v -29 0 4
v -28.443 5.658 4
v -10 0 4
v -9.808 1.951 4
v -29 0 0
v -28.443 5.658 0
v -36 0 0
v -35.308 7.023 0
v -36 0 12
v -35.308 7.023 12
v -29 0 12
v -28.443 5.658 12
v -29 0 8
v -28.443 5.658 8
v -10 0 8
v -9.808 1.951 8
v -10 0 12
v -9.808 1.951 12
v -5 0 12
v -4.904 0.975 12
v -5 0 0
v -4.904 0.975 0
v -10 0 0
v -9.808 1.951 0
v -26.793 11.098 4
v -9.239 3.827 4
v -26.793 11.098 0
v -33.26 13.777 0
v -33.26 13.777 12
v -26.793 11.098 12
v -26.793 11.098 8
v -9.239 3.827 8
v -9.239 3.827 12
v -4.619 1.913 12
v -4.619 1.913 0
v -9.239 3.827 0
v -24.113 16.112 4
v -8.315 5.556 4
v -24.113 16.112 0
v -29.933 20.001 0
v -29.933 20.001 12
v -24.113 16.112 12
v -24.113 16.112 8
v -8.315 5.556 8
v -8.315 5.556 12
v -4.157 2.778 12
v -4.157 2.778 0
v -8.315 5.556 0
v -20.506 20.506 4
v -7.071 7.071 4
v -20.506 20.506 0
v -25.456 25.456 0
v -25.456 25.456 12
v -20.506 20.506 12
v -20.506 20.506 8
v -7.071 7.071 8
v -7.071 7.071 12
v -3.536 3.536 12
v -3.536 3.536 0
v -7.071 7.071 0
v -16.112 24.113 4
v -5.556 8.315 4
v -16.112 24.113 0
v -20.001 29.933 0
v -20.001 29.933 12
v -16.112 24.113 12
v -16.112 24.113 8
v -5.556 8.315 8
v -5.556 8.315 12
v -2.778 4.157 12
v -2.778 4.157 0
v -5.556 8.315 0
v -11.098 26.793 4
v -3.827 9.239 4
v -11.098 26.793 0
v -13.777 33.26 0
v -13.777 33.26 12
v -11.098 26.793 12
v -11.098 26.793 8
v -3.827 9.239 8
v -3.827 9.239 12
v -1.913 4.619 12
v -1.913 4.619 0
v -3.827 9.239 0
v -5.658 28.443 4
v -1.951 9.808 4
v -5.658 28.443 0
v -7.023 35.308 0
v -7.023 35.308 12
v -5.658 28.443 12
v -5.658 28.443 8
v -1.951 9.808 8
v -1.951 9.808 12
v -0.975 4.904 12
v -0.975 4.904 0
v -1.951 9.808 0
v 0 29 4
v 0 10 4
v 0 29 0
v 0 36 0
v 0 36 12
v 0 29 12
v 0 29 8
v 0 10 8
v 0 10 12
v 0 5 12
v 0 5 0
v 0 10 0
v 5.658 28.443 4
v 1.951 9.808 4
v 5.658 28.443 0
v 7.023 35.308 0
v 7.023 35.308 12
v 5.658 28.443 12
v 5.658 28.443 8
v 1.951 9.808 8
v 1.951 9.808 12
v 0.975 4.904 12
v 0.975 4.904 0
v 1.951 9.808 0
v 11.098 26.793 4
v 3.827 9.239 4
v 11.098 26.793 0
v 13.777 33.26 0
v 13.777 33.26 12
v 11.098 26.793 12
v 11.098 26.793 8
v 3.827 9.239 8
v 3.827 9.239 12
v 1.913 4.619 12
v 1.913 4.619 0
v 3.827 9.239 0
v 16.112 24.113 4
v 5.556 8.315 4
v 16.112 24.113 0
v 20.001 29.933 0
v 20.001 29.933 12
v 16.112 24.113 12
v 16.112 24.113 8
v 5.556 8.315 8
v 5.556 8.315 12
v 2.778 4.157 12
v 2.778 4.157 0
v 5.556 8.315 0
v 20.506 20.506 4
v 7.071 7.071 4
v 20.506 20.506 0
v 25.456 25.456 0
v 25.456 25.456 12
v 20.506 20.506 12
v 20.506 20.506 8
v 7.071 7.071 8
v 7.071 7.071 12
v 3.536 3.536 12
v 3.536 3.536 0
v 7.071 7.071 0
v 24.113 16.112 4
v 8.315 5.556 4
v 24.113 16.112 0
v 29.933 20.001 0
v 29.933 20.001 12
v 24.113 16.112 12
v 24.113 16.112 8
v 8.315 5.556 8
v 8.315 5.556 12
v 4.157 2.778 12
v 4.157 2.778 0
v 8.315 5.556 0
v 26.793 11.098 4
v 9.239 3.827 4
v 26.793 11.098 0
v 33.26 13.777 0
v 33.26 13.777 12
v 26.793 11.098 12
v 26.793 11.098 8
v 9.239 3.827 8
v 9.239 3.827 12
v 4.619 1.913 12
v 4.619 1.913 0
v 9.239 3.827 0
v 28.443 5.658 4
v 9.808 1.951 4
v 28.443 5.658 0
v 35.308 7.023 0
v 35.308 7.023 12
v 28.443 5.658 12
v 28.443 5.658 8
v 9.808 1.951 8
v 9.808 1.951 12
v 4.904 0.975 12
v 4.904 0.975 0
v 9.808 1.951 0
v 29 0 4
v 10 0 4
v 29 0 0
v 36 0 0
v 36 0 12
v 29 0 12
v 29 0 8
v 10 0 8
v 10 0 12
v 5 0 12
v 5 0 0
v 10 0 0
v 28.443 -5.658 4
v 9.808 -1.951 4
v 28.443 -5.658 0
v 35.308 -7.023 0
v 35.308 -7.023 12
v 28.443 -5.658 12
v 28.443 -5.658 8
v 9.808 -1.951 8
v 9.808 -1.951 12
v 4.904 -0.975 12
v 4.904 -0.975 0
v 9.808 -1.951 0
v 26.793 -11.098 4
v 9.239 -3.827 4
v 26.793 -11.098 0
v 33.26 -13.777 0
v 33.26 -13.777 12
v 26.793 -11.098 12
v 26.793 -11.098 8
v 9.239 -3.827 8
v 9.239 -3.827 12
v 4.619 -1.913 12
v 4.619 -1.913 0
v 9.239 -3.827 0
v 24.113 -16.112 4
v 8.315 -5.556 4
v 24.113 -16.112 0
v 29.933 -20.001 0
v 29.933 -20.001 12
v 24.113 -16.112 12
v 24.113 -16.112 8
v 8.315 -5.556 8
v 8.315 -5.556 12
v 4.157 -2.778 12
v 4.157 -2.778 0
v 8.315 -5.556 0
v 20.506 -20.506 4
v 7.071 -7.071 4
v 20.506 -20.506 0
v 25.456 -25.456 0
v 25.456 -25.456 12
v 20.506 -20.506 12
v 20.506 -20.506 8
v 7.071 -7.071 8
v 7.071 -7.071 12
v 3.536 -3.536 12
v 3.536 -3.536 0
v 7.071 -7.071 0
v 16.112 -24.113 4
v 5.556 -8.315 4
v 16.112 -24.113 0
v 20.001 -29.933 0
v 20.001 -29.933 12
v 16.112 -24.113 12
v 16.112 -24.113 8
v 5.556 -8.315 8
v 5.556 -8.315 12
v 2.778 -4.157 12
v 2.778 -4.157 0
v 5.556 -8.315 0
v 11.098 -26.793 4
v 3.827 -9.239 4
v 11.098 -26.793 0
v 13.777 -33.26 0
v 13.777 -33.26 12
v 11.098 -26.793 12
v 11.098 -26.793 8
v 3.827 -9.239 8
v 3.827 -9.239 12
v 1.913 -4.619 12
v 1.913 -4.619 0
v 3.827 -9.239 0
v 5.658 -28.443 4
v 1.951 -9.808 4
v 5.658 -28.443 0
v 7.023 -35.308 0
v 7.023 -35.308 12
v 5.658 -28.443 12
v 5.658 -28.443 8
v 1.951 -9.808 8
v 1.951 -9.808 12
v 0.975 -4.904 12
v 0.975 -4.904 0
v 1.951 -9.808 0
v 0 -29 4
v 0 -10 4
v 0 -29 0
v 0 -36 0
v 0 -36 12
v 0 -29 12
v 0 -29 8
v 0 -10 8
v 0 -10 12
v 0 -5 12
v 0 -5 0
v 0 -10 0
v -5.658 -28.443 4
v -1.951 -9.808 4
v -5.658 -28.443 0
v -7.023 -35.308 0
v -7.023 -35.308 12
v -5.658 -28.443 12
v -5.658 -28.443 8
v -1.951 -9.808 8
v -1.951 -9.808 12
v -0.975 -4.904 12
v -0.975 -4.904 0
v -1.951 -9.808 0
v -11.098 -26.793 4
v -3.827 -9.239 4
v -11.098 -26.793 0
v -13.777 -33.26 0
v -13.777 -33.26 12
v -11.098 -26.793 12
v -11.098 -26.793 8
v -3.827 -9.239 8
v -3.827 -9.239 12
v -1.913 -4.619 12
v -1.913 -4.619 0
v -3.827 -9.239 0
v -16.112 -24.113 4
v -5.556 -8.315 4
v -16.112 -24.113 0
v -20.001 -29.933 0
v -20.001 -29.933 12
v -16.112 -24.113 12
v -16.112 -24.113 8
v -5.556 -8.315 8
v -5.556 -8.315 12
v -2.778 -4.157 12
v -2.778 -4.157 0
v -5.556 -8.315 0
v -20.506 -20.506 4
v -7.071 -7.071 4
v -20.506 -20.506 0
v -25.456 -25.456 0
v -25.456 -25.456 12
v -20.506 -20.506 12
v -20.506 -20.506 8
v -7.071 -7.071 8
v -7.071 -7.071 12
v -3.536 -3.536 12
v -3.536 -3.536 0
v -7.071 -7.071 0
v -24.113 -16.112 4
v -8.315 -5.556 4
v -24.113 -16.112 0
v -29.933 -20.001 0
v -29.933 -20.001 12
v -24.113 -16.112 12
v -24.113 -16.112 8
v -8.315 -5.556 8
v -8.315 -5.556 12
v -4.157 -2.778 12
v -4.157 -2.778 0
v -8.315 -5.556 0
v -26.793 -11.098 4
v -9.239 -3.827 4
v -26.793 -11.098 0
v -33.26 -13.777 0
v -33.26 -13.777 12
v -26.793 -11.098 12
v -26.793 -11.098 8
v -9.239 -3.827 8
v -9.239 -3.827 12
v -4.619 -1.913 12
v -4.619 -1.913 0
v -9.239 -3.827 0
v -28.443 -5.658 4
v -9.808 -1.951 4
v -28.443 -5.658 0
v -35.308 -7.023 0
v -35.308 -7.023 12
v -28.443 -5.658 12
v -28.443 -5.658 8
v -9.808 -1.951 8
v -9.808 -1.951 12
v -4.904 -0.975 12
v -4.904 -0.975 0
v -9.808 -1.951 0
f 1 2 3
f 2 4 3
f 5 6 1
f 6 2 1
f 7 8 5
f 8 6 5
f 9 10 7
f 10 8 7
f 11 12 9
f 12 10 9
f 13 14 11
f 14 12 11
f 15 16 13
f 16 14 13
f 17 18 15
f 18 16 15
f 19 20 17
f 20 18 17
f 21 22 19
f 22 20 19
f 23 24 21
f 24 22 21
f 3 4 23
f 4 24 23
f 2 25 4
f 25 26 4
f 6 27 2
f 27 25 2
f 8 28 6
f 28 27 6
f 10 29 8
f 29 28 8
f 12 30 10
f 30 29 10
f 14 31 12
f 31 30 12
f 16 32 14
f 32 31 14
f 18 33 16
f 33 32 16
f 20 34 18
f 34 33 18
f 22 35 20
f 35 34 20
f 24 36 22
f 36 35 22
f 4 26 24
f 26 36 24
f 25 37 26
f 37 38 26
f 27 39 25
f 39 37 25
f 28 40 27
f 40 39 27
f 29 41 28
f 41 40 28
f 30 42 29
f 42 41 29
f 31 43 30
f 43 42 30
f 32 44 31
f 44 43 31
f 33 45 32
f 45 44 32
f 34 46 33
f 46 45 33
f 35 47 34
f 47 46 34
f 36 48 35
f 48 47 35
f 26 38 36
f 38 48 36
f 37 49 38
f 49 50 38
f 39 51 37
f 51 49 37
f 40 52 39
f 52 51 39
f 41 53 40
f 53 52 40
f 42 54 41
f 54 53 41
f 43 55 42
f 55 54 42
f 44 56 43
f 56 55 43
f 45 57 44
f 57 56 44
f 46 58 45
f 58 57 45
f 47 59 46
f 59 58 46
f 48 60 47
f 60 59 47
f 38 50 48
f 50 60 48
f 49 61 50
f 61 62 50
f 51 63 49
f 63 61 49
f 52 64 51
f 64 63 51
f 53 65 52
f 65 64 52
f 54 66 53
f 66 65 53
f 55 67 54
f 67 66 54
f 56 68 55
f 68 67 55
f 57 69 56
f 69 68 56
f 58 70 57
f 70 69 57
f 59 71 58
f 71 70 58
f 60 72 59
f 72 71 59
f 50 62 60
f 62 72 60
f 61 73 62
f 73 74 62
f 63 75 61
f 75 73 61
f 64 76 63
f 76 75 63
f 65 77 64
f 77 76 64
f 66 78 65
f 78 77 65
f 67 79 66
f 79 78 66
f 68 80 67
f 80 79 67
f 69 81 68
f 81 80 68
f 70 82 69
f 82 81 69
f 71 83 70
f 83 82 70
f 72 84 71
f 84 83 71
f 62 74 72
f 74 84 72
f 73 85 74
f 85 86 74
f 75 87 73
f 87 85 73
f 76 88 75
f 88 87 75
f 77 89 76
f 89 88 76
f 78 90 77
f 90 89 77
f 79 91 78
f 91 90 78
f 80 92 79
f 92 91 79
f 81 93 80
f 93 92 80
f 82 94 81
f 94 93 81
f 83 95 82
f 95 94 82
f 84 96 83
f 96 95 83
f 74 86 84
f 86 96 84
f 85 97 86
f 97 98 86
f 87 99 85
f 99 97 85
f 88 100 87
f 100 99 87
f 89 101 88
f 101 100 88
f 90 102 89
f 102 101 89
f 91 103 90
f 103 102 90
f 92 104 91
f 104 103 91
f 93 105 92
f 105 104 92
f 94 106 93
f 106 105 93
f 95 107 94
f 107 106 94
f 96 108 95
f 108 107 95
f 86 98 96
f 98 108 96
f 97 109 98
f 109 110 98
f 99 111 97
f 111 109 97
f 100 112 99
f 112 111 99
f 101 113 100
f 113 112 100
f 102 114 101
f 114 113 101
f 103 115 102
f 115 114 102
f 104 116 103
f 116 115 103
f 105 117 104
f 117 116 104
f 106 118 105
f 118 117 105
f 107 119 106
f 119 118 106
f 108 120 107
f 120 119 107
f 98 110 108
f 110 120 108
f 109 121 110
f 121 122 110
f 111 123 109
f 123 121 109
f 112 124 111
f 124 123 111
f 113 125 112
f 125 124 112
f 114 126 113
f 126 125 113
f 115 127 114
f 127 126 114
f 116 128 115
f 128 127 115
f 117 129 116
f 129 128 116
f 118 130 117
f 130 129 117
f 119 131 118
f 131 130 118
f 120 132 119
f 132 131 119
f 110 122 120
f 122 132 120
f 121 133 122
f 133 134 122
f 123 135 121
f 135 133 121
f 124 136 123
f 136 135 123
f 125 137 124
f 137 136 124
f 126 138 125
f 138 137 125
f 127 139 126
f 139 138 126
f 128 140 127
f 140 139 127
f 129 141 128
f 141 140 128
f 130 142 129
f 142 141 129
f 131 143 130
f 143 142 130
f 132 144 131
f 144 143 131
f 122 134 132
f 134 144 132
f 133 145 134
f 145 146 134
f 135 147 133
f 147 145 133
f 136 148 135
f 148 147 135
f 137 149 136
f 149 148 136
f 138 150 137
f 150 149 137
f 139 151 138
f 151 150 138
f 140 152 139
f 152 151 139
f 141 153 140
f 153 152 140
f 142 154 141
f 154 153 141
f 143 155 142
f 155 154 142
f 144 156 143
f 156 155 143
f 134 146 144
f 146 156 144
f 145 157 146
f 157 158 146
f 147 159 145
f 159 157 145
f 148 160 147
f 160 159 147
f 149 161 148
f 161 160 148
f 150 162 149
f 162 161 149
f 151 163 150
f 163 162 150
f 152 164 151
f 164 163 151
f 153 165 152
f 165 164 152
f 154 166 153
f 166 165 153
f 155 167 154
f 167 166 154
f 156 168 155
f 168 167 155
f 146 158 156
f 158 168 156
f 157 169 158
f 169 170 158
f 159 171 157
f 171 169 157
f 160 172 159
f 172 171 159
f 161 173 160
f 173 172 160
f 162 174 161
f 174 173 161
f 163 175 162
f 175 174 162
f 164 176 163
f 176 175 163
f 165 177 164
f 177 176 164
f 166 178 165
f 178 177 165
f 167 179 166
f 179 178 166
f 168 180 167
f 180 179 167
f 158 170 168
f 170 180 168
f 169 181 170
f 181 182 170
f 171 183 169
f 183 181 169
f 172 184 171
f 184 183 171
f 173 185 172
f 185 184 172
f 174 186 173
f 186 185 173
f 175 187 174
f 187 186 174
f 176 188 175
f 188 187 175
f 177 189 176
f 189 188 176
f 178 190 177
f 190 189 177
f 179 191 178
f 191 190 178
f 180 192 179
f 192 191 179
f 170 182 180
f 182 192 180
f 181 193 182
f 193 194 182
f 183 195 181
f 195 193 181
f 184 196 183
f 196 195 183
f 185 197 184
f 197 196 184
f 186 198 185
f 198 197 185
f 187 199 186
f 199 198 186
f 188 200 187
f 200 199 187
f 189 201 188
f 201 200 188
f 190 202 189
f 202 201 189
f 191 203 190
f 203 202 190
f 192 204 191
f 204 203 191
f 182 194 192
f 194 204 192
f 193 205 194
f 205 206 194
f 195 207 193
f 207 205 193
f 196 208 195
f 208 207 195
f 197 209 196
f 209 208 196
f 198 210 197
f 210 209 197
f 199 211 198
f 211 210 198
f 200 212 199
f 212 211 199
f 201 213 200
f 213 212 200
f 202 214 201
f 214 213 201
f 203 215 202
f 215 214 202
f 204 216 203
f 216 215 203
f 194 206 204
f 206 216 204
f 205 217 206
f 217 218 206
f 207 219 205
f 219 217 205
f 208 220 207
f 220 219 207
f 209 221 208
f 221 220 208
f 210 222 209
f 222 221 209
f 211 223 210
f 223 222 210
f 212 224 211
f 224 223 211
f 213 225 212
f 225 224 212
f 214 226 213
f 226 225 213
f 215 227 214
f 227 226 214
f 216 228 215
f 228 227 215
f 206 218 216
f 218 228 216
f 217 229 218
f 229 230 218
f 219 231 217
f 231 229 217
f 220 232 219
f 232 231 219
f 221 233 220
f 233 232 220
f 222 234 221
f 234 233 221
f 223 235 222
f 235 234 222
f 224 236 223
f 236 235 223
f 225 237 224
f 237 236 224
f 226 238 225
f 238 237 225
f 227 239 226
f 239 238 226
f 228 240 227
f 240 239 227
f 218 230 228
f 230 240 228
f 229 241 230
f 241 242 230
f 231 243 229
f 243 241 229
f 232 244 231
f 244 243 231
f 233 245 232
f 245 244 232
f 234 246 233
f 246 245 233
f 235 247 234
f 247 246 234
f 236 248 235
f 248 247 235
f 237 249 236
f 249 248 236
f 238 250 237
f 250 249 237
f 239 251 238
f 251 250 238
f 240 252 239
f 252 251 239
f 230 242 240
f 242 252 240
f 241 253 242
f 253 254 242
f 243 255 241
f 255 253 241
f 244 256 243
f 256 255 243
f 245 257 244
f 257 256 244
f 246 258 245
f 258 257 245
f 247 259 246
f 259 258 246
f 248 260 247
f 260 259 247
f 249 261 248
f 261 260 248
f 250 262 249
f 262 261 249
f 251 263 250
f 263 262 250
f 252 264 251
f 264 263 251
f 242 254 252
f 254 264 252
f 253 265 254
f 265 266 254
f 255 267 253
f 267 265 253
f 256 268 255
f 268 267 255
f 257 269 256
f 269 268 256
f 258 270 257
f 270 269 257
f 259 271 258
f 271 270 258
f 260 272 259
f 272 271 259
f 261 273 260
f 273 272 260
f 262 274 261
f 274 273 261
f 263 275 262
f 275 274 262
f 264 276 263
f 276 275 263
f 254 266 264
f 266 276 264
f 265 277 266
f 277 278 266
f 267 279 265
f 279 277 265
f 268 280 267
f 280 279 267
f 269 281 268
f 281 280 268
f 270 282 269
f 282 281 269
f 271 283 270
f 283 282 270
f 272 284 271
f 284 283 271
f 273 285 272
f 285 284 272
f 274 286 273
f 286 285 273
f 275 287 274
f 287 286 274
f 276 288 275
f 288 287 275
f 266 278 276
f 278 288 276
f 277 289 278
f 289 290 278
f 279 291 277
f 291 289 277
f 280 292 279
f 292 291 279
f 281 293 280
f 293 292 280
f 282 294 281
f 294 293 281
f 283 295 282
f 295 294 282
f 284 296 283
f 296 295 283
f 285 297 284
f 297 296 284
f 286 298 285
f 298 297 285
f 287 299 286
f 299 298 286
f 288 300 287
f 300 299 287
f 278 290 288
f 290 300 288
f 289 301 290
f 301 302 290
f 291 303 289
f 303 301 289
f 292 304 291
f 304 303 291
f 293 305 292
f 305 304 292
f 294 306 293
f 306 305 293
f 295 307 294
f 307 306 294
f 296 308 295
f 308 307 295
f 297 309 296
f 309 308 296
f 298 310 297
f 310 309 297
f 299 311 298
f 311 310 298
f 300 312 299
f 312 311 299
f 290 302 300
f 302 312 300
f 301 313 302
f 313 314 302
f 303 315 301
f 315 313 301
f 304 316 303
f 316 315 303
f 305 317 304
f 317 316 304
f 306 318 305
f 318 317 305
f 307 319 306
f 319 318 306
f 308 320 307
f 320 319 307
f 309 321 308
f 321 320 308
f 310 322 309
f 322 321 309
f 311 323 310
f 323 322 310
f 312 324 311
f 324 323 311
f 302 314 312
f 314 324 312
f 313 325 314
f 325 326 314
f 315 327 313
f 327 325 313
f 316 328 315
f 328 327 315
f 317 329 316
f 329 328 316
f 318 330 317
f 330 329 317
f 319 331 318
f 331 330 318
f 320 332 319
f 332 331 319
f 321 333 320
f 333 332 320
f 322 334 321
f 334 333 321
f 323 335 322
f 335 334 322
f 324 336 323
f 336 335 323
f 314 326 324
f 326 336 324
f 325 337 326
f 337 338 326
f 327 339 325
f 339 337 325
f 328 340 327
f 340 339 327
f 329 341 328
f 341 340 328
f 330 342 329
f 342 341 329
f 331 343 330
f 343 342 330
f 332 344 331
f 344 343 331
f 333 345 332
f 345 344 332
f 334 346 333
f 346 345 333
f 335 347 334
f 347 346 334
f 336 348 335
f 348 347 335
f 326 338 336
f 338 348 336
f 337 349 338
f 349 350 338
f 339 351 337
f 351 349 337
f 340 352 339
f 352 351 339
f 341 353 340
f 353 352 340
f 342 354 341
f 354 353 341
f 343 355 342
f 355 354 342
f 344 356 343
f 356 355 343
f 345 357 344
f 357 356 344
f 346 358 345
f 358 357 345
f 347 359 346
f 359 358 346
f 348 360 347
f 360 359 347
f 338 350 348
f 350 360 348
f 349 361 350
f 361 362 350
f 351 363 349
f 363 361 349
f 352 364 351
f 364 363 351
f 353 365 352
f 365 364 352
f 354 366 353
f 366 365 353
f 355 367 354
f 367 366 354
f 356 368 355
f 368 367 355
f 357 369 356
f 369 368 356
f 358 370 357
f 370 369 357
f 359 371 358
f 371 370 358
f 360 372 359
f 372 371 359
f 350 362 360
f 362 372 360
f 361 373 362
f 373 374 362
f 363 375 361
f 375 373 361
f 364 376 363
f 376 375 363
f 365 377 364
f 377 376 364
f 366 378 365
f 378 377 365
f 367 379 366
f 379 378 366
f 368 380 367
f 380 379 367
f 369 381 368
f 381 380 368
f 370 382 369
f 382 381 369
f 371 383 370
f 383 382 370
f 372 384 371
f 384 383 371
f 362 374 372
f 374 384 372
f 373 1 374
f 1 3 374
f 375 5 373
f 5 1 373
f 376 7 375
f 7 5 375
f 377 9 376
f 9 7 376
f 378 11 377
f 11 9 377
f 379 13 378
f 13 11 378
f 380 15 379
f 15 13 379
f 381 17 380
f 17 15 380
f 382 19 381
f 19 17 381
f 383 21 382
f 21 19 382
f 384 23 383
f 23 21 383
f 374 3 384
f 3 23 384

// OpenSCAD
$fn = 32;

// ----------------------------------------------------------------------
// Revolved part: handwheel R36
// ----------------------------------------------------------------------

// --- parameters (mm) ---
bore_r = 5;               // bore radius
rim_r = 36;               // rim radius
rim_w = 7;                // rim axial width
rim_t = 12;               // rim diameter height
hub_r = 10;               // hub radius
web_t = 4;                // web thickness
revolve_angle = 360;      // revolve sweep, degrees

bore_d = 2 * bore_r;
rim_d = 2 * rim_r;
hub_d = 2 * hub_r;

profile = [[5, 0], [10, 0], [10, 4], [29, 4], [29, 0], [36, 0], [36, 12], [29, 12], [29, 8], [10, 8], [10, 12], [5, 12]];  // primary outline, 12 points, counter clockwise

// --- the one profile operation ---
rotate_extrude(angle = revolve_angle) polygon(points = profile);
